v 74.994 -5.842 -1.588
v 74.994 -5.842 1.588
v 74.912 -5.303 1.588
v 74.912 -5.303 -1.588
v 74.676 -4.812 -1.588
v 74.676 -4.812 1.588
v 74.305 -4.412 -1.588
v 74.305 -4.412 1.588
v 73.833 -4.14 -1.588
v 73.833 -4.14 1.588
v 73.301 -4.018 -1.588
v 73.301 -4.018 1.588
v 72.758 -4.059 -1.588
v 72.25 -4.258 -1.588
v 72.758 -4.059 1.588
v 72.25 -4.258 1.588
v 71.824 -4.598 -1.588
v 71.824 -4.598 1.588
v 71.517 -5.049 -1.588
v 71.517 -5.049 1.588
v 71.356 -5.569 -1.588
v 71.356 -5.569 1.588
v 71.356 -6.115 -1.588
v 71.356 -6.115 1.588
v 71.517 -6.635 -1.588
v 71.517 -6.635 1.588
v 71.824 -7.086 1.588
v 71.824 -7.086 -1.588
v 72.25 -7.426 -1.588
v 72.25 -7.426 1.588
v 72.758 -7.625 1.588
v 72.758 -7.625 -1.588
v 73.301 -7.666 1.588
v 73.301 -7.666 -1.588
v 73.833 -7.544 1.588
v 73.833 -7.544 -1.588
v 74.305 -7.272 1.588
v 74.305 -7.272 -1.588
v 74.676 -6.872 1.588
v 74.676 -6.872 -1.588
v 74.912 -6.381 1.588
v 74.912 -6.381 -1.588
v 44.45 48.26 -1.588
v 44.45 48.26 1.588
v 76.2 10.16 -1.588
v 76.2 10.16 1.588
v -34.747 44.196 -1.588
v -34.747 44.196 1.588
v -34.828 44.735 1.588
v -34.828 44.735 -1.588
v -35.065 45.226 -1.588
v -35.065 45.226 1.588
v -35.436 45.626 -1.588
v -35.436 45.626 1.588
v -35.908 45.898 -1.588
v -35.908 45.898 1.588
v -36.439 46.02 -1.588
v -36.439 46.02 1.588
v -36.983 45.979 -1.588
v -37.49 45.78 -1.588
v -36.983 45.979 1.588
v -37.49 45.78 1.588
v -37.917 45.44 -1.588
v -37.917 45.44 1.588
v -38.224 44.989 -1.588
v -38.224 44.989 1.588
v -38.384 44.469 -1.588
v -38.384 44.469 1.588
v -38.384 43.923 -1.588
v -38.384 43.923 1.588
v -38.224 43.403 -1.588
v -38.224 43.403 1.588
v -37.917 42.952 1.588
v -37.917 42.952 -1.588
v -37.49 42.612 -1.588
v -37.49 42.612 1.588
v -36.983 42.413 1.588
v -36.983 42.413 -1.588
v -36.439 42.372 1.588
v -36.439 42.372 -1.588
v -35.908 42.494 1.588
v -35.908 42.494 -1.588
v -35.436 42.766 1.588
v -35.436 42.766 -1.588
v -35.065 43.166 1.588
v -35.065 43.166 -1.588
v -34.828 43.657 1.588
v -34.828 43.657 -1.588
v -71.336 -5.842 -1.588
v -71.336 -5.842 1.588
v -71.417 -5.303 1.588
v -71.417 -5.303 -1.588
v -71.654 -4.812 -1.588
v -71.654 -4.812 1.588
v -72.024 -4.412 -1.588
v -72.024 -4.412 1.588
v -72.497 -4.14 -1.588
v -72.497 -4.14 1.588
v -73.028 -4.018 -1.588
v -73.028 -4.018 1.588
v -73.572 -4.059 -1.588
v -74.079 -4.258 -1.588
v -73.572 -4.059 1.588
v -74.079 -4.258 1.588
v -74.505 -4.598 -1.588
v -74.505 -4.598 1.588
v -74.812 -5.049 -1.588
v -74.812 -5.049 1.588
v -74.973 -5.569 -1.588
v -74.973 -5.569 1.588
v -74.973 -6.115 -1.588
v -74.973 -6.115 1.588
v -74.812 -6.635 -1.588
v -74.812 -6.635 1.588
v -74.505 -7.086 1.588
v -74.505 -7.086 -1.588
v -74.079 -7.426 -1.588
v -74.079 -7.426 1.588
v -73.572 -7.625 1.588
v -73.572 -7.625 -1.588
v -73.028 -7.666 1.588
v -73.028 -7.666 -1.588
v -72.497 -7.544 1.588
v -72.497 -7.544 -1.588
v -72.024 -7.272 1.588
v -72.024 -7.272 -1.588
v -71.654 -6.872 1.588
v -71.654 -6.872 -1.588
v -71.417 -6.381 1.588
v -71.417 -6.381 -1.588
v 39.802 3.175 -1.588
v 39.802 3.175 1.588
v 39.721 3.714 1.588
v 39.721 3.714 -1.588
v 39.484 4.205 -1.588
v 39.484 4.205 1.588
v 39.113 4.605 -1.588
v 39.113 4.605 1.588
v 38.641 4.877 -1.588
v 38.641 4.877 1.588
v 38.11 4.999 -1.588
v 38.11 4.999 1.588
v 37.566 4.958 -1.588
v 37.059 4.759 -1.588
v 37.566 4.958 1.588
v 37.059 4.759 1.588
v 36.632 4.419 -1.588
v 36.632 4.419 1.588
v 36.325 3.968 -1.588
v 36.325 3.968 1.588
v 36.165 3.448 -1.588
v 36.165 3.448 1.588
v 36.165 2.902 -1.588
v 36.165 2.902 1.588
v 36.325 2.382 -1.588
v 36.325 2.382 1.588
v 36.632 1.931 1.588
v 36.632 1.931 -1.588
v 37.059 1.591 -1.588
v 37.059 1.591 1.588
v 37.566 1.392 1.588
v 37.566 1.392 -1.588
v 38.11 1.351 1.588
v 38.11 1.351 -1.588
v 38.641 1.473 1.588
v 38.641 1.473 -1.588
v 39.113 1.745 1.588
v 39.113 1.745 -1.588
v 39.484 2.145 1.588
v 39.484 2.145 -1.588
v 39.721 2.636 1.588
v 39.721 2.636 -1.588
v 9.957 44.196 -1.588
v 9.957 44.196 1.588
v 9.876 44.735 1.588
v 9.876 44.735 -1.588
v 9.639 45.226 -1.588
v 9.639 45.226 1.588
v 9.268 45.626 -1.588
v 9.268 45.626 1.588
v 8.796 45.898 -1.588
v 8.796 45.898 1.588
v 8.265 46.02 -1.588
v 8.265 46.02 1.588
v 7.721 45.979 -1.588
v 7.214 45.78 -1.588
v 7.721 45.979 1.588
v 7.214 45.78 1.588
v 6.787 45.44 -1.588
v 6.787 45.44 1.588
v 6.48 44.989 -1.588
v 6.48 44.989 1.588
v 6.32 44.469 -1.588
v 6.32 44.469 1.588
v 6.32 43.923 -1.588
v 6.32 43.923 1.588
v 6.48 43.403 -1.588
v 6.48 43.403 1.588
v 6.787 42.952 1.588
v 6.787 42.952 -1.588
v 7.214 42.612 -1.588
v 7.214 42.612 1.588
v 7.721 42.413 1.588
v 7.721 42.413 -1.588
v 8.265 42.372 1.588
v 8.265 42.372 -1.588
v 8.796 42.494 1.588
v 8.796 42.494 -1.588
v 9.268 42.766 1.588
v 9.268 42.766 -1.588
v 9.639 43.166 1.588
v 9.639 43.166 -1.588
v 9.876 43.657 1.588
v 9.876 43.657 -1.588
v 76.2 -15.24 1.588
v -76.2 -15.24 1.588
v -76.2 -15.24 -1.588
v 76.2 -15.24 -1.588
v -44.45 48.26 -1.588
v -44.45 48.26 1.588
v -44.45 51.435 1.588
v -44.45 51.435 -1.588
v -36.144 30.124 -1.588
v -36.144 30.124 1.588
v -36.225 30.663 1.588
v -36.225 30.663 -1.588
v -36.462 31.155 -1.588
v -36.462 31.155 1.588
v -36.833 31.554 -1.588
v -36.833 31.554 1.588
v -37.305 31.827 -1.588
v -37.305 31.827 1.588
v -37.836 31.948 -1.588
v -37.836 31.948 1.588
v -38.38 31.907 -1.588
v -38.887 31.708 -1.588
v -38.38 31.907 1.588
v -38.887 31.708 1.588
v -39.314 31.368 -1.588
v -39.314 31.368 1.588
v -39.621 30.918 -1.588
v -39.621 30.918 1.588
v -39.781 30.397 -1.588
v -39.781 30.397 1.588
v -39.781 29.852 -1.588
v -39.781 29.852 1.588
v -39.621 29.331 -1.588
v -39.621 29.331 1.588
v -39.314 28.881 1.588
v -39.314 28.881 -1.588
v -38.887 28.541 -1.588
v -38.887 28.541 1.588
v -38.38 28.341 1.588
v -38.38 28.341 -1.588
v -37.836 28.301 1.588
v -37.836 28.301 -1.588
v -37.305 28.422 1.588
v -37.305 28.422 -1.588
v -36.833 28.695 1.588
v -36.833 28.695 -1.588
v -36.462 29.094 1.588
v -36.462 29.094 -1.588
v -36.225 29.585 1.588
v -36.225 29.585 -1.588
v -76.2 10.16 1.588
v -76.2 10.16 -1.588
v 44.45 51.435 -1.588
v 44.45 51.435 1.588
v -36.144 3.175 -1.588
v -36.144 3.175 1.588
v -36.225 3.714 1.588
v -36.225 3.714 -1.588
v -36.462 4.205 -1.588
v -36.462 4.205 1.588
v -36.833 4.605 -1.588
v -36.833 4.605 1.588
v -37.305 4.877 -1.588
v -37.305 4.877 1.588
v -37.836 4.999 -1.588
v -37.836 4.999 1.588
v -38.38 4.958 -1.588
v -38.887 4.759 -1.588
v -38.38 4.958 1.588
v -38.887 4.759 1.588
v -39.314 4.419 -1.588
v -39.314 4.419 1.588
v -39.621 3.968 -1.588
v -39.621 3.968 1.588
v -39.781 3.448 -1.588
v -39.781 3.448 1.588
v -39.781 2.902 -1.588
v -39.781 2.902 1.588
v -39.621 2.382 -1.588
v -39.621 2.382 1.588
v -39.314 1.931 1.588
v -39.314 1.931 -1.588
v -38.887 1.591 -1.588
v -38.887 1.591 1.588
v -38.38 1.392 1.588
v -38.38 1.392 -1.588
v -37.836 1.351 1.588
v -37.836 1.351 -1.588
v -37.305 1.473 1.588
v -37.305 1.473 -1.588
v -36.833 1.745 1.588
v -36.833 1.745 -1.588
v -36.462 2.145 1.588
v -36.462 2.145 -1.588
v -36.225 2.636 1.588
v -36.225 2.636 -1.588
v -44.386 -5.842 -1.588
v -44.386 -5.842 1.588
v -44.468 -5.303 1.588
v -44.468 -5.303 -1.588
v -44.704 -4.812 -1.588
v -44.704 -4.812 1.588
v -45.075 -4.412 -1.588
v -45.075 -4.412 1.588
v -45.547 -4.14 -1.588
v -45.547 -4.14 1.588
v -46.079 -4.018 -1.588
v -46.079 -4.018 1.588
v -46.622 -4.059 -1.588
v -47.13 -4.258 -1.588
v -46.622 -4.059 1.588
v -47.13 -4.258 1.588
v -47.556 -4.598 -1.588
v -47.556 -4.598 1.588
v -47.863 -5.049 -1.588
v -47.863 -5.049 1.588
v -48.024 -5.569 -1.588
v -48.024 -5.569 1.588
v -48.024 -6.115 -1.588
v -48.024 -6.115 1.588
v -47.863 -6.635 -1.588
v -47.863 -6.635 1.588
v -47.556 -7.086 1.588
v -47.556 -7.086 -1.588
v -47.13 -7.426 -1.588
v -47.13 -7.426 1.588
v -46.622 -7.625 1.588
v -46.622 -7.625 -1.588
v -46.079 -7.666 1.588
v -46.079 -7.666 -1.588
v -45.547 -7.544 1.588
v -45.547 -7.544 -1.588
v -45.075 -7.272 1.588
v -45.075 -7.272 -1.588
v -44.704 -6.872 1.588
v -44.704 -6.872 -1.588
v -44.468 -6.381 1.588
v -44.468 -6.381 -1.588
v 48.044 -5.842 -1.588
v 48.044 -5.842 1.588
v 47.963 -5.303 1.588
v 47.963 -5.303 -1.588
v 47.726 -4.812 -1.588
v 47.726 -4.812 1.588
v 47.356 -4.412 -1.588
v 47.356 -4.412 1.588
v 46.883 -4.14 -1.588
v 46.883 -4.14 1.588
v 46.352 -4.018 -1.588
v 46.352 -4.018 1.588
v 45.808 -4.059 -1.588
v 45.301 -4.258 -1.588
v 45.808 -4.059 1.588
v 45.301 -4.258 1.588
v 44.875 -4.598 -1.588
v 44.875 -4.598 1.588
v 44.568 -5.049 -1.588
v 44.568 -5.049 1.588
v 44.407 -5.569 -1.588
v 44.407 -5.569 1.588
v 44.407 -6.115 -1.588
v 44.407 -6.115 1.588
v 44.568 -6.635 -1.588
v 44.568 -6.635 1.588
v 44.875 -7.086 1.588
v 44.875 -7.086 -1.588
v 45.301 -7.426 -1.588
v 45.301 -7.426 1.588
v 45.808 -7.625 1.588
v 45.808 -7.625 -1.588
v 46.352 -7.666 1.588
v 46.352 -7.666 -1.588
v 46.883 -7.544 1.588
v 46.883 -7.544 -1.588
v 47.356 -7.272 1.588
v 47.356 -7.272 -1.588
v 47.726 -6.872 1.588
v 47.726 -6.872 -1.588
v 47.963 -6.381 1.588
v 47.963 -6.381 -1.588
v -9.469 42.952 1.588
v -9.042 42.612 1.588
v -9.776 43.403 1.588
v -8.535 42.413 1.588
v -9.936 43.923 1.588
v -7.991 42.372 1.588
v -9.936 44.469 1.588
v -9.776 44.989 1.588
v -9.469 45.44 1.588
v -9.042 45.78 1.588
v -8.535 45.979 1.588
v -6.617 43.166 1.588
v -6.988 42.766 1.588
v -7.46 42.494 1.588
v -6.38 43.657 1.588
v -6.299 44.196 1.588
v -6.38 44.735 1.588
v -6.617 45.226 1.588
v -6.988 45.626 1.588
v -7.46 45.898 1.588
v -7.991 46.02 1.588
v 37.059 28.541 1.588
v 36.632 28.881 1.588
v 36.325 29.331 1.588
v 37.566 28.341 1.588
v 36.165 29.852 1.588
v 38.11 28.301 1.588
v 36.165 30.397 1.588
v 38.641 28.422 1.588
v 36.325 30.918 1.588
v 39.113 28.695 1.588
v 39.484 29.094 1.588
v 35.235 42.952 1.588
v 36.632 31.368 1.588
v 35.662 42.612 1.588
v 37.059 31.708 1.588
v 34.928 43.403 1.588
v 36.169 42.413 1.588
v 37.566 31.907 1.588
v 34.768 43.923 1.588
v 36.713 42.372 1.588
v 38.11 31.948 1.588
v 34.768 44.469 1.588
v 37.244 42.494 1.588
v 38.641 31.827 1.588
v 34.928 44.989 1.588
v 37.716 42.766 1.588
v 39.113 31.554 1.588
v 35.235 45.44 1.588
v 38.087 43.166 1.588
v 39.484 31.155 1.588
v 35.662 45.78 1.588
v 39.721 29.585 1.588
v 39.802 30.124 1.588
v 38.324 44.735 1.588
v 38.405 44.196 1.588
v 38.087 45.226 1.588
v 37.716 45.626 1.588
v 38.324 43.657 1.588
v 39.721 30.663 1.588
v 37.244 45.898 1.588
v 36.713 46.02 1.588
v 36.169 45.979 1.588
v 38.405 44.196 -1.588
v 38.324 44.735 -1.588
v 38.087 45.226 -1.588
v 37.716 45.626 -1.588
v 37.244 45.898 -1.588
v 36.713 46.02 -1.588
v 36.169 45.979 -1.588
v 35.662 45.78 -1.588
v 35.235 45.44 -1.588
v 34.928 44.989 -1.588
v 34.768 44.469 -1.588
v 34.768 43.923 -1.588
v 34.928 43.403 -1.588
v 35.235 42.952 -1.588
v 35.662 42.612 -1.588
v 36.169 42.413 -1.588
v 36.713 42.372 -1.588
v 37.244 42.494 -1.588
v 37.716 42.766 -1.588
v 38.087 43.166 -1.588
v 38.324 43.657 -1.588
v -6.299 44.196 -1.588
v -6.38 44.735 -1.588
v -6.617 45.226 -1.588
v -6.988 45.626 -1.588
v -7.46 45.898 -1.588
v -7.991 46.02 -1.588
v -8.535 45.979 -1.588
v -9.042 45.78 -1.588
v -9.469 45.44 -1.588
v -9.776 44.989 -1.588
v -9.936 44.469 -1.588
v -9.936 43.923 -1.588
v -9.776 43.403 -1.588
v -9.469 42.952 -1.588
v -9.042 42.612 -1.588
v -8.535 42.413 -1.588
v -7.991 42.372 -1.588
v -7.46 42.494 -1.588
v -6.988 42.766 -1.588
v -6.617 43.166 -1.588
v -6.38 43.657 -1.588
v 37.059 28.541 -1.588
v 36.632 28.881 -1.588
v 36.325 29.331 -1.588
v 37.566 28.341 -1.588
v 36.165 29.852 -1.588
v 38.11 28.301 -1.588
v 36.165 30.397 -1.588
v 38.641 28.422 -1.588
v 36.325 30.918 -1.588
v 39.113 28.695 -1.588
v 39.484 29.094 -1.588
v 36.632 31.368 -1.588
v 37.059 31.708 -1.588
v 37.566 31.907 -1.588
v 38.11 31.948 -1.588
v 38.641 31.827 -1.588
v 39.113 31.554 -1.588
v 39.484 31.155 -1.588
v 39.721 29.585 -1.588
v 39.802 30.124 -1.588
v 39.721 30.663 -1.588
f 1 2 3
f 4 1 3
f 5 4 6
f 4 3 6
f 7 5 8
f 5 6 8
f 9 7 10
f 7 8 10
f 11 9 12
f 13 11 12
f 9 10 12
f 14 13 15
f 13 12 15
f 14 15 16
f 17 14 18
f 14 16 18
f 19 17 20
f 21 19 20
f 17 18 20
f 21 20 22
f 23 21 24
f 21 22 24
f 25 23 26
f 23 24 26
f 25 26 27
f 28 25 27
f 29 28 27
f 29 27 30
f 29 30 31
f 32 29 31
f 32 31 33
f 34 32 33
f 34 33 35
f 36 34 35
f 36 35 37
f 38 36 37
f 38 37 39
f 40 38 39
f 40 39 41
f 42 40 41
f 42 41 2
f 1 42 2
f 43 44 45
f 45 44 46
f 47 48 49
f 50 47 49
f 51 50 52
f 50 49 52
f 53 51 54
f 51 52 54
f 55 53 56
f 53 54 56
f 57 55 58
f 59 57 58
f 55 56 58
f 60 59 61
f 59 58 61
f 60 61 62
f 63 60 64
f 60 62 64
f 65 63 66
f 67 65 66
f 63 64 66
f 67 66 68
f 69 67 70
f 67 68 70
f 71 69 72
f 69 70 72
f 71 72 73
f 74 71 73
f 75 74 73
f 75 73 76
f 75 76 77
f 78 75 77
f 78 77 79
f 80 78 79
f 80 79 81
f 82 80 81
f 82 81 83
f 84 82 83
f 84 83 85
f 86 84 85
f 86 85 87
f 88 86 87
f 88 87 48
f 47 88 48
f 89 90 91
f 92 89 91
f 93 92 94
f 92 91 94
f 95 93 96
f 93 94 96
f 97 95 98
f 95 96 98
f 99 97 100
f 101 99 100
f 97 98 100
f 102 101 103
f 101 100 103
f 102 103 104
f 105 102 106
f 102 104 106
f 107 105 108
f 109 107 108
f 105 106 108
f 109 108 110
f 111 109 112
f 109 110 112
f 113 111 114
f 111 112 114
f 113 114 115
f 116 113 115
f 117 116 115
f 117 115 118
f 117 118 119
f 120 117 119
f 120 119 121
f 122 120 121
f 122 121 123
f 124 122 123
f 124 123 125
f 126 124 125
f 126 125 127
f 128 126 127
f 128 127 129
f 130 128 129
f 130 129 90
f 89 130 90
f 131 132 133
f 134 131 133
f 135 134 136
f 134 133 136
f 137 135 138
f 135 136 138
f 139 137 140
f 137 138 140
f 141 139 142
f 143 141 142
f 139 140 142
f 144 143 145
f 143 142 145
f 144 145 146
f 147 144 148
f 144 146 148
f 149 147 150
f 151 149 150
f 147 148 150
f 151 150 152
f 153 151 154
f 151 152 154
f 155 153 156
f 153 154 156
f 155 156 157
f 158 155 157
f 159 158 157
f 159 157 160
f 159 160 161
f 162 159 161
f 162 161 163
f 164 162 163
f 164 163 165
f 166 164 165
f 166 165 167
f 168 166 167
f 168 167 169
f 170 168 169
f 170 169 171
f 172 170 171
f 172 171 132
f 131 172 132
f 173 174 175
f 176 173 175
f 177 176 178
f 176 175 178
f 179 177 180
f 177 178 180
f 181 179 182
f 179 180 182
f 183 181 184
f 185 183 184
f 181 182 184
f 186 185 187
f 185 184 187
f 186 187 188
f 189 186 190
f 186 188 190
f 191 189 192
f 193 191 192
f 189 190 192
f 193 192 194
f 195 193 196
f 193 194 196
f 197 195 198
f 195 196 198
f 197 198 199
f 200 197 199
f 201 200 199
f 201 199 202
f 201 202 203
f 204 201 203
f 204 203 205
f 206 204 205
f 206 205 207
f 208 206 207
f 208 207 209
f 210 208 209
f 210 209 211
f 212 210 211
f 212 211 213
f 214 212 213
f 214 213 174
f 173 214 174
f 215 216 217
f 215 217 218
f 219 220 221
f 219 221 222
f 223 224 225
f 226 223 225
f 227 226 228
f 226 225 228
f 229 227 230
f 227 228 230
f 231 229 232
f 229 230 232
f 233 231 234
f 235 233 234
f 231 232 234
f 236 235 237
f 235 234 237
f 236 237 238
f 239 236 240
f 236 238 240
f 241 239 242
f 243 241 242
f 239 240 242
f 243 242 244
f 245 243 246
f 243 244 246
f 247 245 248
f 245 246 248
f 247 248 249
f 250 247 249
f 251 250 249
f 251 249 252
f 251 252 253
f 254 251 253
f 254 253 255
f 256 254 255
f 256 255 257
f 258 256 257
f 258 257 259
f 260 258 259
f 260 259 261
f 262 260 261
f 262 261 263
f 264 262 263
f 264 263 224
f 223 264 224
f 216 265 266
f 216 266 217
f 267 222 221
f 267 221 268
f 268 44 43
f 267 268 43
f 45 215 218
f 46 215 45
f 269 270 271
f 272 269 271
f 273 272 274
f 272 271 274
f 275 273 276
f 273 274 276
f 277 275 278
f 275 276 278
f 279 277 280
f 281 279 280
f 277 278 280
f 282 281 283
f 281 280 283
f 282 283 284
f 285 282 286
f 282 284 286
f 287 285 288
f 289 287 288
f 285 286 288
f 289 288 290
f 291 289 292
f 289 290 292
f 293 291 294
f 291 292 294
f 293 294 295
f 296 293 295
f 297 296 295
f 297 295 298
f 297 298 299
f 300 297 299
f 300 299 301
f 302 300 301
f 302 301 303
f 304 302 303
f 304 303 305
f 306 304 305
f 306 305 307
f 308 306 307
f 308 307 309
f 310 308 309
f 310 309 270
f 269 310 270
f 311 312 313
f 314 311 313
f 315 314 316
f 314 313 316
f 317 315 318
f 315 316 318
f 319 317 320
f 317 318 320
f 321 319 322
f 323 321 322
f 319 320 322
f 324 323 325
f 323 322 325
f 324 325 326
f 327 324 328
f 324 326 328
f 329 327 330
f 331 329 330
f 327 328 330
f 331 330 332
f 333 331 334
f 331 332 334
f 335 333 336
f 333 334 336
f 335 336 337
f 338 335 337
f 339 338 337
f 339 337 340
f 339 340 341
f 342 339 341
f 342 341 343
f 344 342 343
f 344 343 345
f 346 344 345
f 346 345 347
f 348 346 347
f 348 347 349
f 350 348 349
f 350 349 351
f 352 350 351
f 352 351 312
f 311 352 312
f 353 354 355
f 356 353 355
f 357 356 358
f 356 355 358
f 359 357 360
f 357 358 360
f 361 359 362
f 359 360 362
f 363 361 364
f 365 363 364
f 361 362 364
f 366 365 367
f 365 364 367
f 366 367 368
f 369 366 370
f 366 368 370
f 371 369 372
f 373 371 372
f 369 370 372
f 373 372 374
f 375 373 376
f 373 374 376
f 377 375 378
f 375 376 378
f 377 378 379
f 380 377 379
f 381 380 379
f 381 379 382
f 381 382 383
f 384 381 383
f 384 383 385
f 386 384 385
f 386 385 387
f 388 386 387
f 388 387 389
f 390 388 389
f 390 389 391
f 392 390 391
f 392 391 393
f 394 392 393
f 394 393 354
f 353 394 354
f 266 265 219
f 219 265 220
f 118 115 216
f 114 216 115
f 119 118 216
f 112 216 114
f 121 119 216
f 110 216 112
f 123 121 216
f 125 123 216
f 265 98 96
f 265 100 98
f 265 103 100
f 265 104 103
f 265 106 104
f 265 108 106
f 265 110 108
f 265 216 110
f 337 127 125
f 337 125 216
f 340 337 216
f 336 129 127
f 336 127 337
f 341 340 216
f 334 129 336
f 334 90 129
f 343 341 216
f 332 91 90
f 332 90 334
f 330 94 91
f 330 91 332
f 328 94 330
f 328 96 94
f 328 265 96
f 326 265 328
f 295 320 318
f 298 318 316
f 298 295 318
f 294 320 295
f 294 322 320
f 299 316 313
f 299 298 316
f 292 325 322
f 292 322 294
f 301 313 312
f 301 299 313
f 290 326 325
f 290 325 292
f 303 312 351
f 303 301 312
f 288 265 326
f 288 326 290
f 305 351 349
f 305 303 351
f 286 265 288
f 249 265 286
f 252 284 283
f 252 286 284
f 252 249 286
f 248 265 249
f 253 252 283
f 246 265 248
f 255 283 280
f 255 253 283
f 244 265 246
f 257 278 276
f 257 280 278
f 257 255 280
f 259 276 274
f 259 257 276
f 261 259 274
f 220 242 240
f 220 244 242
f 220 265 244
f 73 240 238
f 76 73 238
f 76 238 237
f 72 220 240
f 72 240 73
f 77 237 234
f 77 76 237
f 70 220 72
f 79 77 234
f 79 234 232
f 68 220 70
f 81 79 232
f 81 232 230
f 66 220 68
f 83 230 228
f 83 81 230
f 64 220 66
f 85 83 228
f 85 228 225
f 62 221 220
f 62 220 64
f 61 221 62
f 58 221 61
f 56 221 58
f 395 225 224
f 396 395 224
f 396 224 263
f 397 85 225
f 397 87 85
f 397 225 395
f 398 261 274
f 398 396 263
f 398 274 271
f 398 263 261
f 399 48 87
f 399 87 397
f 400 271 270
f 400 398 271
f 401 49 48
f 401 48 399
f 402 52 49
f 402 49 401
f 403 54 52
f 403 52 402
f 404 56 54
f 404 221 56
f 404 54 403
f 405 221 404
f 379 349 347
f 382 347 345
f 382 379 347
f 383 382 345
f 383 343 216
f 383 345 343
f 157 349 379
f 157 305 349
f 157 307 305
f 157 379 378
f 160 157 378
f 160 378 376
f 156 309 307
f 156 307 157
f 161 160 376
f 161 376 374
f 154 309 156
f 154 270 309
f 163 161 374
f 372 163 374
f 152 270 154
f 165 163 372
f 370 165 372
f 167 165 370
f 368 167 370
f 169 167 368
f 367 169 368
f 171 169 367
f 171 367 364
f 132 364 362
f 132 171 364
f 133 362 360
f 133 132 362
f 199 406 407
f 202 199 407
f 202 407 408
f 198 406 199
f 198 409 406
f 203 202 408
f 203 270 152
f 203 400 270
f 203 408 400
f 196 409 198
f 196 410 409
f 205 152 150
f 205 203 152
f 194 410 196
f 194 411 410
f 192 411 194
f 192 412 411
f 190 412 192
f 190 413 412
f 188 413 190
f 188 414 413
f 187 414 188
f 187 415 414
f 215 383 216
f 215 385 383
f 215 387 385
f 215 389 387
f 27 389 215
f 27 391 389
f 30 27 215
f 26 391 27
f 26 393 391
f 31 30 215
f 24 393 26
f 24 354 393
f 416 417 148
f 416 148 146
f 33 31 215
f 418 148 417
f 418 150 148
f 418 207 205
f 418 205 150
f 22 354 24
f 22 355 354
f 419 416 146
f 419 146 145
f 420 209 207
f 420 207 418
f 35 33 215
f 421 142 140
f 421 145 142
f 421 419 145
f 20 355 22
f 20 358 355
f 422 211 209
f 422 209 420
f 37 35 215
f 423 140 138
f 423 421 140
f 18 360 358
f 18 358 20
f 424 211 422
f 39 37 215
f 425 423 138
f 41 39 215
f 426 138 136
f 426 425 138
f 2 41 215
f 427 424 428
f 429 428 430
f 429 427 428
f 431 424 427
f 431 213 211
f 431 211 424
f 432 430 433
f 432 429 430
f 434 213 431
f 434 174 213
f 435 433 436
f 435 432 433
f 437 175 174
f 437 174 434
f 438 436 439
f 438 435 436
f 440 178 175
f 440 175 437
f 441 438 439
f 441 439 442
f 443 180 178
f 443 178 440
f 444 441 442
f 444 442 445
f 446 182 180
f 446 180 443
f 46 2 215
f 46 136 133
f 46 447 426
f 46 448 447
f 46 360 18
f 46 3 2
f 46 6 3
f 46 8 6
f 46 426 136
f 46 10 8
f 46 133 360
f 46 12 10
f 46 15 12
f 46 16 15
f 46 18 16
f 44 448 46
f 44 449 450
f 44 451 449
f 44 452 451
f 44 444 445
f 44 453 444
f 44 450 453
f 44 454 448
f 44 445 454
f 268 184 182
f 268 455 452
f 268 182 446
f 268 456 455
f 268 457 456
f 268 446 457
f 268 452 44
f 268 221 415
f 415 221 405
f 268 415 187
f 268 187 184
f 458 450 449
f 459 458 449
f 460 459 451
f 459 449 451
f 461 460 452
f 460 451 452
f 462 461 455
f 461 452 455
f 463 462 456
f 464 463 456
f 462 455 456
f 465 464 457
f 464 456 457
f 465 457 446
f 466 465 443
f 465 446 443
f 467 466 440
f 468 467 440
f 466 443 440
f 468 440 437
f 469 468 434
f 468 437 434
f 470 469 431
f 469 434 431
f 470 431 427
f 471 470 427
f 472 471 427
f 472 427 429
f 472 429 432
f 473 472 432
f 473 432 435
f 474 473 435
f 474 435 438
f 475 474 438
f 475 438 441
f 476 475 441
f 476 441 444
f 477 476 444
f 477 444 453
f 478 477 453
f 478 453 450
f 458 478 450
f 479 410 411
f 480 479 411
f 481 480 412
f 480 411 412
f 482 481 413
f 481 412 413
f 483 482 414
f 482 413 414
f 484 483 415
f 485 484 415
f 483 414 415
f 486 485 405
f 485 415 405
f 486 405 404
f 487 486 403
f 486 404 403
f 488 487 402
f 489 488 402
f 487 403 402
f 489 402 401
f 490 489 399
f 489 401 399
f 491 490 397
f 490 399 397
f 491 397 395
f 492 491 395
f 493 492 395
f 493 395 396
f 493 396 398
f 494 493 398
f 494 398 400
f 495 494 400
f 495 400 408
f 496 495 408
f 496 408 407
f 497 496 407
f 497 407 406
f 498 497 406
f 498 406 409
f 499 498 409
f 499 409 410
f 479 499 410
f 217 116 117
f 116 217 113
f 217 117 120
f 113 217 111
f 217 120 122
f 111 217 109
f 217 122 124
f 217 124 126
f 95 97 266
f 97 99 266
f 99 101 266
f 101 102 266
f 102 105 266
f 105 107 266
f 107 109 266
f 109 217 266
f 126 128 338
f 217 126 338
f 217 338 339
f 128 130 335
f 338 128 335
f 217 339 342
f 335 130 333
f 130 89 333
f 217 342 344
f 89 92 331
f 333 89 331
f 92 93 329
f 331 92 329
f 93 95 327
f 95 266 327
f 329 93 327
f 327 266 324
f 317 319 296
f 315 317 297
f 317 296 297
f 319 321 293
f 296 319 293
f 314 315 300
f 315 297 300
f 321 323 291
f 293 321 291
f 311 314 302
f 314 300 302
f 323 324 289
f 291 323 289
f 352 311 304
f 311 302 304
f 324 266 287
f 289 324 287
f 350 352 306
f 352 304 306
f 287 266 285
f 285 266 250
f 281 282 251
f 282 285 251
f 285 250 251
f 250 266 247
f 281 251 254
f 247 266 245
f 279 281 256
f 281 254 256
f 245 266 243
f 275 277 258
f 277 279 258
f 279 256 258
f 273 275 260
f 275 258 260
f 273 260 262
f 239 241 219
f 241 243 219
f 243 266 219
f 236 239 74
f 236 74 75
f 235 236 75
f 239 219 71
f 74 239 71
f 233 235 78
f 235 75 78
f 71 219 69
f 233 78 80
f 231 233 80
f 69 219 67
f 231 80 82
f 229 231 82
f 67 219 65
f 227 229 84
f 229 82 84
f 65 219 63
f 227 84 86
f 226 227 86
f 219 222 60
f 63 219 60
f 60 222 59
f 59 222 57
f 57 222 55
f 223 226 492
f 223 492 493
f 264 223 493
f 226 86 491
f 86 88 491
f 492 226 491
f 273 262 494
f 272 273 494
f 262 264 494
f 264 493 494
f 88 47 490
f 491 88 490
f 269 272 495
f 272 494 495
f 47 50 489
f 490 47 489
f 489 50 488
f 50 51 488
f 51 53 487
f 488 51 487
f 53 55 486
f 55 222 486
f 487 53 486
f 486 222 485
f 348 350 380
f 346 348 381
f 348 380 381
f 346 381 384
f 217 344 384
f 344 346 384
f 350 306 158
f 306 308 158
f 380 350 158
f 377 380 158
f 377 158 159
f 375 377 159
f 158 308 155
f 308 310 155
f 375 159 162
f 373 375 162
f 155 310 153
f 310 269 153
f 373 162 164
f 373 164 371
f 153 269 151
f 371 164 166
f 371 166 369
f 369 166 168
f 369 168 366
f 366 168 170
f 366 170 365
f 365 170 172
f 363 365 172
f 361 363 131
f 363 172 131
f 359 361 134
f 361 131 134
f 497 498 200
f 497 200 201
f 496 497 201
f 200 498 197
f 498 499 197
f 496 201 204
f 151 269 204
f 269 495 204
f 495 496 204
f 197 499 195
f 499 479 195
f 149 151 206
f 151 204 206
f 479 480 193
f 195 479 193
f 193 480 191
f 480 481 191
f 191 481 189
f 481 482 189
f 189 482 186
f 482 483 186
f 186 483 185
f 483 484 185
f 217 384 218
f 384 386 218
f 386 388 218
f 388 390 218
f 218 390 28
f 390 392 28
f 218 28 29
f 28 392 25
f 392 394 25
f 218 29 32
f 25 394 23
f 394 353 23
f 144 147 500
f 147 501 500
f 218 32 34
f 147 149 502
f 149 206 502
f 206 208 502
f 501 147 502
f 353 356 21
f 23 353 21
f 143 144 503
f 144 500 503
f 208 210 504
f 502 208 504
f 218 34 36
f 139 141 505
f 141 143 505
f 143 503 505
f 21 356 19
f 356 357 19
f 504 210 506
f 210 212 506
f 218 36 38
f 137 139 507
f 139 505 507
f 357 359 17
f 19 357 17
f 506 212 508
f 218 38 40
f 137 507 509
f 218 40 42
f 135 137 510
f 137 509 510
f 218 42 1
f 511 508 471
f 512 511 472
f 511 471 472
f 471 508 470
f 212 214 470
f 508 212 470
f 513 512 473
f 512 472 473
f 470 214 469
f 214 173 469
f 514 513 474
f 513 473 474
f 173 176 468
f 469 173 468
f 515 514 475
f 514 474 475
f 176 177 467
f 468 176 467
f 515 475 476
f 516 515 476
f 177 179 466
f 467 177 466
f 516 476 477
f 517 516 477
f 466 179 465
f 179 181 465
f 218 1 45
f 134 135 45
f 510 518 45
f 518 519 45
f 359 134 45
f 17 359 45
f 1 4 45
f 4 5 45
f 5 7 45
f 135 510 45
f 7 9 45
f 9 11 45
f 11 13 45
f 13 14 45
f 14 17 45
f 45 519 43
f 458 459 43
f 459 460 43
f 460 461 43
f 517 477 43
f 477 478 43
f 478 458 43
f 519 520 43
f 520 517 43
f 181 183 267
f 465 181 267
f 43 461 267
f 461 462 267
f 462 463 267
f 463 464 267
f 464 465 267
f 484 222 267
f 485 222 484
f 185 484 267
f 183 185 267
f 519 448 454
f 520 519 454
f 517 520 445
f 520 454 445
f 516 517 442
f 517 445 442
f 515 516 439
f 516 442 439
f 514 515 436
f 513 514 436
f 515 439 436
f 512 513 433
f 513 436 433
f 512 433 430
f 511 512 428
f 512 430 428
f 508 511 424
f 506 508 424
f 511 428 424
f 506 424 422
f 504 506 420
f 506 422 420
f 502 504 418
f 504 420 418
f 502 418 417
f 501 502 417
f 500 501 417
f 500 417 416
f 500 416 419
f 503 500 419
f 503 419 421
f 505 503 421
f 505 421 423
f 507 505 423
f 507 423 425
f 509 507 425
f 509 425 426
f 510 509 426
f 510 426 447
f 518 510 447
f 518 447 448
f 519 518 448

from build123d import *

# Parameters (mm, degrees)
SKETCH1_W           = 88.9
SKETCH1_H           = 3.175
BOSS_EXTRUDE1_DEPTH = 51.435
SKETCH2_R           = 1.8288
CUT_EXTRUDE1_DEPTH  = 4.175
SKETCH3_R           = 1.8288
CUT_EXTRUDE2_DEPTH  = 4.175
BOSS_EXTRUDE2_DEPTH = 3.175
CUT_EXTRUDE3_DEPTH  = 4.175
SKETCH6_R           = 1.8288
CUT_EXTRUDE4_DEPTH  = 4.175


with BuildPart() as part:
    # Sketch1 → Boss-Extrude1 (new body)
    with BuildSketch(Plane(origin=(0, 0, 0), x_dir=(1, 0, 0), z_dir=(0, 1, 0))):
        Rectangle(SKETCH1_W, SKETCH1_H)
    extrude(amount=BOSS_EXTRUDE1_DEPTH)

    # Sketch2 → Cut-Extrude1 (cut, through all)
    with BuildSketch(Plane.XY.offset(1.5875)):
        with Locations((-36.576, 44.196)):
            Circle(SKETCH2_R)
        with Locations((-8.128, 44.196)):
            Circle(SKETCH2_R)
        with Locations((8.128, 44.196)):
            Circle(SKETCH2_R)
        with Locations((36.576, 44.196)):
            Circle(SKETCH2_R)
    extrude(amount=-CUT_EXTRUDE1_DEPTH, mode=Mode.SUBTRACT)

    # Sketch3 → Cut-Extrude2 (cut, through all)
    with BuildSketch(Plane.XY.offset(1.5875)):
        with Locations((-37.973, 3.175)):
            Circle(SKETCH3_R)
        with Locations((-37.973, 30.1244)):
            Circle(SKETCH3_R)
        with Locations((37.973, 3.175)):
            Circle(SKETCH3_R)
        with Locations((37.973, 30.1244)):
            Circle(SKETCH3_R)
    extrude(amount=-CUT_EXTRUDE2_DEPTH, mode=Mode.SUBTRACT)

    # Sketch4 → Boss-Extrude2 (add)
    with BuildSketch(Plane.XY.offset(1.5875)):
        Polygon((-44.45, 0), (-44.45, 48.26), (-76.2, 48.26), (-76.2, 0), (-76.2, -15.24), (76.2, -15.24), (76.2, 0), (76.2, 48.26), (44.45, 48.26), (44.45, 0), (0, 0), align=None)
    extrude(amount=-BOSS_EXTRUDE2_DEPTH)

    # Sketch5 → Cut-Extrude3 (cut, through all)
    with BuildSketch(Plane.XY.offset(1.5875)):
        Polygon((-76.2, 10.16), (-44.45, 48.26), (-76.2, 48.26), align=None)
        Polygon((44.45, 48.26), (76.2, 10.16), (76.2, 48.26), align=None)
    extrude(amount=-CUT_EXTRUDE3_DEPTH, mode=Mode.SUBTRACT)

    # Sketch6 → Cut-Extrude4 (cut, through all)
    with BuildSketch(Plane.XY.offset(1.5875)):
        with Locations((-73.1647, -5.842)):
            Circle(SKETCH6_R)
        with Locations((-46.2153, -5.842)):
            Circle(SKETCH6_R)
        with Locations((46.2153, -5.842)):
            Circle(SKETCH6_R)
        with Locations((73.1647, -5.842)):
            Circle(SKETCH6_R)
    extrude(amount=-CUT_EXTRUDE4_DEPTH, mode=Mode.SUBTRACT)


solid = part.part
